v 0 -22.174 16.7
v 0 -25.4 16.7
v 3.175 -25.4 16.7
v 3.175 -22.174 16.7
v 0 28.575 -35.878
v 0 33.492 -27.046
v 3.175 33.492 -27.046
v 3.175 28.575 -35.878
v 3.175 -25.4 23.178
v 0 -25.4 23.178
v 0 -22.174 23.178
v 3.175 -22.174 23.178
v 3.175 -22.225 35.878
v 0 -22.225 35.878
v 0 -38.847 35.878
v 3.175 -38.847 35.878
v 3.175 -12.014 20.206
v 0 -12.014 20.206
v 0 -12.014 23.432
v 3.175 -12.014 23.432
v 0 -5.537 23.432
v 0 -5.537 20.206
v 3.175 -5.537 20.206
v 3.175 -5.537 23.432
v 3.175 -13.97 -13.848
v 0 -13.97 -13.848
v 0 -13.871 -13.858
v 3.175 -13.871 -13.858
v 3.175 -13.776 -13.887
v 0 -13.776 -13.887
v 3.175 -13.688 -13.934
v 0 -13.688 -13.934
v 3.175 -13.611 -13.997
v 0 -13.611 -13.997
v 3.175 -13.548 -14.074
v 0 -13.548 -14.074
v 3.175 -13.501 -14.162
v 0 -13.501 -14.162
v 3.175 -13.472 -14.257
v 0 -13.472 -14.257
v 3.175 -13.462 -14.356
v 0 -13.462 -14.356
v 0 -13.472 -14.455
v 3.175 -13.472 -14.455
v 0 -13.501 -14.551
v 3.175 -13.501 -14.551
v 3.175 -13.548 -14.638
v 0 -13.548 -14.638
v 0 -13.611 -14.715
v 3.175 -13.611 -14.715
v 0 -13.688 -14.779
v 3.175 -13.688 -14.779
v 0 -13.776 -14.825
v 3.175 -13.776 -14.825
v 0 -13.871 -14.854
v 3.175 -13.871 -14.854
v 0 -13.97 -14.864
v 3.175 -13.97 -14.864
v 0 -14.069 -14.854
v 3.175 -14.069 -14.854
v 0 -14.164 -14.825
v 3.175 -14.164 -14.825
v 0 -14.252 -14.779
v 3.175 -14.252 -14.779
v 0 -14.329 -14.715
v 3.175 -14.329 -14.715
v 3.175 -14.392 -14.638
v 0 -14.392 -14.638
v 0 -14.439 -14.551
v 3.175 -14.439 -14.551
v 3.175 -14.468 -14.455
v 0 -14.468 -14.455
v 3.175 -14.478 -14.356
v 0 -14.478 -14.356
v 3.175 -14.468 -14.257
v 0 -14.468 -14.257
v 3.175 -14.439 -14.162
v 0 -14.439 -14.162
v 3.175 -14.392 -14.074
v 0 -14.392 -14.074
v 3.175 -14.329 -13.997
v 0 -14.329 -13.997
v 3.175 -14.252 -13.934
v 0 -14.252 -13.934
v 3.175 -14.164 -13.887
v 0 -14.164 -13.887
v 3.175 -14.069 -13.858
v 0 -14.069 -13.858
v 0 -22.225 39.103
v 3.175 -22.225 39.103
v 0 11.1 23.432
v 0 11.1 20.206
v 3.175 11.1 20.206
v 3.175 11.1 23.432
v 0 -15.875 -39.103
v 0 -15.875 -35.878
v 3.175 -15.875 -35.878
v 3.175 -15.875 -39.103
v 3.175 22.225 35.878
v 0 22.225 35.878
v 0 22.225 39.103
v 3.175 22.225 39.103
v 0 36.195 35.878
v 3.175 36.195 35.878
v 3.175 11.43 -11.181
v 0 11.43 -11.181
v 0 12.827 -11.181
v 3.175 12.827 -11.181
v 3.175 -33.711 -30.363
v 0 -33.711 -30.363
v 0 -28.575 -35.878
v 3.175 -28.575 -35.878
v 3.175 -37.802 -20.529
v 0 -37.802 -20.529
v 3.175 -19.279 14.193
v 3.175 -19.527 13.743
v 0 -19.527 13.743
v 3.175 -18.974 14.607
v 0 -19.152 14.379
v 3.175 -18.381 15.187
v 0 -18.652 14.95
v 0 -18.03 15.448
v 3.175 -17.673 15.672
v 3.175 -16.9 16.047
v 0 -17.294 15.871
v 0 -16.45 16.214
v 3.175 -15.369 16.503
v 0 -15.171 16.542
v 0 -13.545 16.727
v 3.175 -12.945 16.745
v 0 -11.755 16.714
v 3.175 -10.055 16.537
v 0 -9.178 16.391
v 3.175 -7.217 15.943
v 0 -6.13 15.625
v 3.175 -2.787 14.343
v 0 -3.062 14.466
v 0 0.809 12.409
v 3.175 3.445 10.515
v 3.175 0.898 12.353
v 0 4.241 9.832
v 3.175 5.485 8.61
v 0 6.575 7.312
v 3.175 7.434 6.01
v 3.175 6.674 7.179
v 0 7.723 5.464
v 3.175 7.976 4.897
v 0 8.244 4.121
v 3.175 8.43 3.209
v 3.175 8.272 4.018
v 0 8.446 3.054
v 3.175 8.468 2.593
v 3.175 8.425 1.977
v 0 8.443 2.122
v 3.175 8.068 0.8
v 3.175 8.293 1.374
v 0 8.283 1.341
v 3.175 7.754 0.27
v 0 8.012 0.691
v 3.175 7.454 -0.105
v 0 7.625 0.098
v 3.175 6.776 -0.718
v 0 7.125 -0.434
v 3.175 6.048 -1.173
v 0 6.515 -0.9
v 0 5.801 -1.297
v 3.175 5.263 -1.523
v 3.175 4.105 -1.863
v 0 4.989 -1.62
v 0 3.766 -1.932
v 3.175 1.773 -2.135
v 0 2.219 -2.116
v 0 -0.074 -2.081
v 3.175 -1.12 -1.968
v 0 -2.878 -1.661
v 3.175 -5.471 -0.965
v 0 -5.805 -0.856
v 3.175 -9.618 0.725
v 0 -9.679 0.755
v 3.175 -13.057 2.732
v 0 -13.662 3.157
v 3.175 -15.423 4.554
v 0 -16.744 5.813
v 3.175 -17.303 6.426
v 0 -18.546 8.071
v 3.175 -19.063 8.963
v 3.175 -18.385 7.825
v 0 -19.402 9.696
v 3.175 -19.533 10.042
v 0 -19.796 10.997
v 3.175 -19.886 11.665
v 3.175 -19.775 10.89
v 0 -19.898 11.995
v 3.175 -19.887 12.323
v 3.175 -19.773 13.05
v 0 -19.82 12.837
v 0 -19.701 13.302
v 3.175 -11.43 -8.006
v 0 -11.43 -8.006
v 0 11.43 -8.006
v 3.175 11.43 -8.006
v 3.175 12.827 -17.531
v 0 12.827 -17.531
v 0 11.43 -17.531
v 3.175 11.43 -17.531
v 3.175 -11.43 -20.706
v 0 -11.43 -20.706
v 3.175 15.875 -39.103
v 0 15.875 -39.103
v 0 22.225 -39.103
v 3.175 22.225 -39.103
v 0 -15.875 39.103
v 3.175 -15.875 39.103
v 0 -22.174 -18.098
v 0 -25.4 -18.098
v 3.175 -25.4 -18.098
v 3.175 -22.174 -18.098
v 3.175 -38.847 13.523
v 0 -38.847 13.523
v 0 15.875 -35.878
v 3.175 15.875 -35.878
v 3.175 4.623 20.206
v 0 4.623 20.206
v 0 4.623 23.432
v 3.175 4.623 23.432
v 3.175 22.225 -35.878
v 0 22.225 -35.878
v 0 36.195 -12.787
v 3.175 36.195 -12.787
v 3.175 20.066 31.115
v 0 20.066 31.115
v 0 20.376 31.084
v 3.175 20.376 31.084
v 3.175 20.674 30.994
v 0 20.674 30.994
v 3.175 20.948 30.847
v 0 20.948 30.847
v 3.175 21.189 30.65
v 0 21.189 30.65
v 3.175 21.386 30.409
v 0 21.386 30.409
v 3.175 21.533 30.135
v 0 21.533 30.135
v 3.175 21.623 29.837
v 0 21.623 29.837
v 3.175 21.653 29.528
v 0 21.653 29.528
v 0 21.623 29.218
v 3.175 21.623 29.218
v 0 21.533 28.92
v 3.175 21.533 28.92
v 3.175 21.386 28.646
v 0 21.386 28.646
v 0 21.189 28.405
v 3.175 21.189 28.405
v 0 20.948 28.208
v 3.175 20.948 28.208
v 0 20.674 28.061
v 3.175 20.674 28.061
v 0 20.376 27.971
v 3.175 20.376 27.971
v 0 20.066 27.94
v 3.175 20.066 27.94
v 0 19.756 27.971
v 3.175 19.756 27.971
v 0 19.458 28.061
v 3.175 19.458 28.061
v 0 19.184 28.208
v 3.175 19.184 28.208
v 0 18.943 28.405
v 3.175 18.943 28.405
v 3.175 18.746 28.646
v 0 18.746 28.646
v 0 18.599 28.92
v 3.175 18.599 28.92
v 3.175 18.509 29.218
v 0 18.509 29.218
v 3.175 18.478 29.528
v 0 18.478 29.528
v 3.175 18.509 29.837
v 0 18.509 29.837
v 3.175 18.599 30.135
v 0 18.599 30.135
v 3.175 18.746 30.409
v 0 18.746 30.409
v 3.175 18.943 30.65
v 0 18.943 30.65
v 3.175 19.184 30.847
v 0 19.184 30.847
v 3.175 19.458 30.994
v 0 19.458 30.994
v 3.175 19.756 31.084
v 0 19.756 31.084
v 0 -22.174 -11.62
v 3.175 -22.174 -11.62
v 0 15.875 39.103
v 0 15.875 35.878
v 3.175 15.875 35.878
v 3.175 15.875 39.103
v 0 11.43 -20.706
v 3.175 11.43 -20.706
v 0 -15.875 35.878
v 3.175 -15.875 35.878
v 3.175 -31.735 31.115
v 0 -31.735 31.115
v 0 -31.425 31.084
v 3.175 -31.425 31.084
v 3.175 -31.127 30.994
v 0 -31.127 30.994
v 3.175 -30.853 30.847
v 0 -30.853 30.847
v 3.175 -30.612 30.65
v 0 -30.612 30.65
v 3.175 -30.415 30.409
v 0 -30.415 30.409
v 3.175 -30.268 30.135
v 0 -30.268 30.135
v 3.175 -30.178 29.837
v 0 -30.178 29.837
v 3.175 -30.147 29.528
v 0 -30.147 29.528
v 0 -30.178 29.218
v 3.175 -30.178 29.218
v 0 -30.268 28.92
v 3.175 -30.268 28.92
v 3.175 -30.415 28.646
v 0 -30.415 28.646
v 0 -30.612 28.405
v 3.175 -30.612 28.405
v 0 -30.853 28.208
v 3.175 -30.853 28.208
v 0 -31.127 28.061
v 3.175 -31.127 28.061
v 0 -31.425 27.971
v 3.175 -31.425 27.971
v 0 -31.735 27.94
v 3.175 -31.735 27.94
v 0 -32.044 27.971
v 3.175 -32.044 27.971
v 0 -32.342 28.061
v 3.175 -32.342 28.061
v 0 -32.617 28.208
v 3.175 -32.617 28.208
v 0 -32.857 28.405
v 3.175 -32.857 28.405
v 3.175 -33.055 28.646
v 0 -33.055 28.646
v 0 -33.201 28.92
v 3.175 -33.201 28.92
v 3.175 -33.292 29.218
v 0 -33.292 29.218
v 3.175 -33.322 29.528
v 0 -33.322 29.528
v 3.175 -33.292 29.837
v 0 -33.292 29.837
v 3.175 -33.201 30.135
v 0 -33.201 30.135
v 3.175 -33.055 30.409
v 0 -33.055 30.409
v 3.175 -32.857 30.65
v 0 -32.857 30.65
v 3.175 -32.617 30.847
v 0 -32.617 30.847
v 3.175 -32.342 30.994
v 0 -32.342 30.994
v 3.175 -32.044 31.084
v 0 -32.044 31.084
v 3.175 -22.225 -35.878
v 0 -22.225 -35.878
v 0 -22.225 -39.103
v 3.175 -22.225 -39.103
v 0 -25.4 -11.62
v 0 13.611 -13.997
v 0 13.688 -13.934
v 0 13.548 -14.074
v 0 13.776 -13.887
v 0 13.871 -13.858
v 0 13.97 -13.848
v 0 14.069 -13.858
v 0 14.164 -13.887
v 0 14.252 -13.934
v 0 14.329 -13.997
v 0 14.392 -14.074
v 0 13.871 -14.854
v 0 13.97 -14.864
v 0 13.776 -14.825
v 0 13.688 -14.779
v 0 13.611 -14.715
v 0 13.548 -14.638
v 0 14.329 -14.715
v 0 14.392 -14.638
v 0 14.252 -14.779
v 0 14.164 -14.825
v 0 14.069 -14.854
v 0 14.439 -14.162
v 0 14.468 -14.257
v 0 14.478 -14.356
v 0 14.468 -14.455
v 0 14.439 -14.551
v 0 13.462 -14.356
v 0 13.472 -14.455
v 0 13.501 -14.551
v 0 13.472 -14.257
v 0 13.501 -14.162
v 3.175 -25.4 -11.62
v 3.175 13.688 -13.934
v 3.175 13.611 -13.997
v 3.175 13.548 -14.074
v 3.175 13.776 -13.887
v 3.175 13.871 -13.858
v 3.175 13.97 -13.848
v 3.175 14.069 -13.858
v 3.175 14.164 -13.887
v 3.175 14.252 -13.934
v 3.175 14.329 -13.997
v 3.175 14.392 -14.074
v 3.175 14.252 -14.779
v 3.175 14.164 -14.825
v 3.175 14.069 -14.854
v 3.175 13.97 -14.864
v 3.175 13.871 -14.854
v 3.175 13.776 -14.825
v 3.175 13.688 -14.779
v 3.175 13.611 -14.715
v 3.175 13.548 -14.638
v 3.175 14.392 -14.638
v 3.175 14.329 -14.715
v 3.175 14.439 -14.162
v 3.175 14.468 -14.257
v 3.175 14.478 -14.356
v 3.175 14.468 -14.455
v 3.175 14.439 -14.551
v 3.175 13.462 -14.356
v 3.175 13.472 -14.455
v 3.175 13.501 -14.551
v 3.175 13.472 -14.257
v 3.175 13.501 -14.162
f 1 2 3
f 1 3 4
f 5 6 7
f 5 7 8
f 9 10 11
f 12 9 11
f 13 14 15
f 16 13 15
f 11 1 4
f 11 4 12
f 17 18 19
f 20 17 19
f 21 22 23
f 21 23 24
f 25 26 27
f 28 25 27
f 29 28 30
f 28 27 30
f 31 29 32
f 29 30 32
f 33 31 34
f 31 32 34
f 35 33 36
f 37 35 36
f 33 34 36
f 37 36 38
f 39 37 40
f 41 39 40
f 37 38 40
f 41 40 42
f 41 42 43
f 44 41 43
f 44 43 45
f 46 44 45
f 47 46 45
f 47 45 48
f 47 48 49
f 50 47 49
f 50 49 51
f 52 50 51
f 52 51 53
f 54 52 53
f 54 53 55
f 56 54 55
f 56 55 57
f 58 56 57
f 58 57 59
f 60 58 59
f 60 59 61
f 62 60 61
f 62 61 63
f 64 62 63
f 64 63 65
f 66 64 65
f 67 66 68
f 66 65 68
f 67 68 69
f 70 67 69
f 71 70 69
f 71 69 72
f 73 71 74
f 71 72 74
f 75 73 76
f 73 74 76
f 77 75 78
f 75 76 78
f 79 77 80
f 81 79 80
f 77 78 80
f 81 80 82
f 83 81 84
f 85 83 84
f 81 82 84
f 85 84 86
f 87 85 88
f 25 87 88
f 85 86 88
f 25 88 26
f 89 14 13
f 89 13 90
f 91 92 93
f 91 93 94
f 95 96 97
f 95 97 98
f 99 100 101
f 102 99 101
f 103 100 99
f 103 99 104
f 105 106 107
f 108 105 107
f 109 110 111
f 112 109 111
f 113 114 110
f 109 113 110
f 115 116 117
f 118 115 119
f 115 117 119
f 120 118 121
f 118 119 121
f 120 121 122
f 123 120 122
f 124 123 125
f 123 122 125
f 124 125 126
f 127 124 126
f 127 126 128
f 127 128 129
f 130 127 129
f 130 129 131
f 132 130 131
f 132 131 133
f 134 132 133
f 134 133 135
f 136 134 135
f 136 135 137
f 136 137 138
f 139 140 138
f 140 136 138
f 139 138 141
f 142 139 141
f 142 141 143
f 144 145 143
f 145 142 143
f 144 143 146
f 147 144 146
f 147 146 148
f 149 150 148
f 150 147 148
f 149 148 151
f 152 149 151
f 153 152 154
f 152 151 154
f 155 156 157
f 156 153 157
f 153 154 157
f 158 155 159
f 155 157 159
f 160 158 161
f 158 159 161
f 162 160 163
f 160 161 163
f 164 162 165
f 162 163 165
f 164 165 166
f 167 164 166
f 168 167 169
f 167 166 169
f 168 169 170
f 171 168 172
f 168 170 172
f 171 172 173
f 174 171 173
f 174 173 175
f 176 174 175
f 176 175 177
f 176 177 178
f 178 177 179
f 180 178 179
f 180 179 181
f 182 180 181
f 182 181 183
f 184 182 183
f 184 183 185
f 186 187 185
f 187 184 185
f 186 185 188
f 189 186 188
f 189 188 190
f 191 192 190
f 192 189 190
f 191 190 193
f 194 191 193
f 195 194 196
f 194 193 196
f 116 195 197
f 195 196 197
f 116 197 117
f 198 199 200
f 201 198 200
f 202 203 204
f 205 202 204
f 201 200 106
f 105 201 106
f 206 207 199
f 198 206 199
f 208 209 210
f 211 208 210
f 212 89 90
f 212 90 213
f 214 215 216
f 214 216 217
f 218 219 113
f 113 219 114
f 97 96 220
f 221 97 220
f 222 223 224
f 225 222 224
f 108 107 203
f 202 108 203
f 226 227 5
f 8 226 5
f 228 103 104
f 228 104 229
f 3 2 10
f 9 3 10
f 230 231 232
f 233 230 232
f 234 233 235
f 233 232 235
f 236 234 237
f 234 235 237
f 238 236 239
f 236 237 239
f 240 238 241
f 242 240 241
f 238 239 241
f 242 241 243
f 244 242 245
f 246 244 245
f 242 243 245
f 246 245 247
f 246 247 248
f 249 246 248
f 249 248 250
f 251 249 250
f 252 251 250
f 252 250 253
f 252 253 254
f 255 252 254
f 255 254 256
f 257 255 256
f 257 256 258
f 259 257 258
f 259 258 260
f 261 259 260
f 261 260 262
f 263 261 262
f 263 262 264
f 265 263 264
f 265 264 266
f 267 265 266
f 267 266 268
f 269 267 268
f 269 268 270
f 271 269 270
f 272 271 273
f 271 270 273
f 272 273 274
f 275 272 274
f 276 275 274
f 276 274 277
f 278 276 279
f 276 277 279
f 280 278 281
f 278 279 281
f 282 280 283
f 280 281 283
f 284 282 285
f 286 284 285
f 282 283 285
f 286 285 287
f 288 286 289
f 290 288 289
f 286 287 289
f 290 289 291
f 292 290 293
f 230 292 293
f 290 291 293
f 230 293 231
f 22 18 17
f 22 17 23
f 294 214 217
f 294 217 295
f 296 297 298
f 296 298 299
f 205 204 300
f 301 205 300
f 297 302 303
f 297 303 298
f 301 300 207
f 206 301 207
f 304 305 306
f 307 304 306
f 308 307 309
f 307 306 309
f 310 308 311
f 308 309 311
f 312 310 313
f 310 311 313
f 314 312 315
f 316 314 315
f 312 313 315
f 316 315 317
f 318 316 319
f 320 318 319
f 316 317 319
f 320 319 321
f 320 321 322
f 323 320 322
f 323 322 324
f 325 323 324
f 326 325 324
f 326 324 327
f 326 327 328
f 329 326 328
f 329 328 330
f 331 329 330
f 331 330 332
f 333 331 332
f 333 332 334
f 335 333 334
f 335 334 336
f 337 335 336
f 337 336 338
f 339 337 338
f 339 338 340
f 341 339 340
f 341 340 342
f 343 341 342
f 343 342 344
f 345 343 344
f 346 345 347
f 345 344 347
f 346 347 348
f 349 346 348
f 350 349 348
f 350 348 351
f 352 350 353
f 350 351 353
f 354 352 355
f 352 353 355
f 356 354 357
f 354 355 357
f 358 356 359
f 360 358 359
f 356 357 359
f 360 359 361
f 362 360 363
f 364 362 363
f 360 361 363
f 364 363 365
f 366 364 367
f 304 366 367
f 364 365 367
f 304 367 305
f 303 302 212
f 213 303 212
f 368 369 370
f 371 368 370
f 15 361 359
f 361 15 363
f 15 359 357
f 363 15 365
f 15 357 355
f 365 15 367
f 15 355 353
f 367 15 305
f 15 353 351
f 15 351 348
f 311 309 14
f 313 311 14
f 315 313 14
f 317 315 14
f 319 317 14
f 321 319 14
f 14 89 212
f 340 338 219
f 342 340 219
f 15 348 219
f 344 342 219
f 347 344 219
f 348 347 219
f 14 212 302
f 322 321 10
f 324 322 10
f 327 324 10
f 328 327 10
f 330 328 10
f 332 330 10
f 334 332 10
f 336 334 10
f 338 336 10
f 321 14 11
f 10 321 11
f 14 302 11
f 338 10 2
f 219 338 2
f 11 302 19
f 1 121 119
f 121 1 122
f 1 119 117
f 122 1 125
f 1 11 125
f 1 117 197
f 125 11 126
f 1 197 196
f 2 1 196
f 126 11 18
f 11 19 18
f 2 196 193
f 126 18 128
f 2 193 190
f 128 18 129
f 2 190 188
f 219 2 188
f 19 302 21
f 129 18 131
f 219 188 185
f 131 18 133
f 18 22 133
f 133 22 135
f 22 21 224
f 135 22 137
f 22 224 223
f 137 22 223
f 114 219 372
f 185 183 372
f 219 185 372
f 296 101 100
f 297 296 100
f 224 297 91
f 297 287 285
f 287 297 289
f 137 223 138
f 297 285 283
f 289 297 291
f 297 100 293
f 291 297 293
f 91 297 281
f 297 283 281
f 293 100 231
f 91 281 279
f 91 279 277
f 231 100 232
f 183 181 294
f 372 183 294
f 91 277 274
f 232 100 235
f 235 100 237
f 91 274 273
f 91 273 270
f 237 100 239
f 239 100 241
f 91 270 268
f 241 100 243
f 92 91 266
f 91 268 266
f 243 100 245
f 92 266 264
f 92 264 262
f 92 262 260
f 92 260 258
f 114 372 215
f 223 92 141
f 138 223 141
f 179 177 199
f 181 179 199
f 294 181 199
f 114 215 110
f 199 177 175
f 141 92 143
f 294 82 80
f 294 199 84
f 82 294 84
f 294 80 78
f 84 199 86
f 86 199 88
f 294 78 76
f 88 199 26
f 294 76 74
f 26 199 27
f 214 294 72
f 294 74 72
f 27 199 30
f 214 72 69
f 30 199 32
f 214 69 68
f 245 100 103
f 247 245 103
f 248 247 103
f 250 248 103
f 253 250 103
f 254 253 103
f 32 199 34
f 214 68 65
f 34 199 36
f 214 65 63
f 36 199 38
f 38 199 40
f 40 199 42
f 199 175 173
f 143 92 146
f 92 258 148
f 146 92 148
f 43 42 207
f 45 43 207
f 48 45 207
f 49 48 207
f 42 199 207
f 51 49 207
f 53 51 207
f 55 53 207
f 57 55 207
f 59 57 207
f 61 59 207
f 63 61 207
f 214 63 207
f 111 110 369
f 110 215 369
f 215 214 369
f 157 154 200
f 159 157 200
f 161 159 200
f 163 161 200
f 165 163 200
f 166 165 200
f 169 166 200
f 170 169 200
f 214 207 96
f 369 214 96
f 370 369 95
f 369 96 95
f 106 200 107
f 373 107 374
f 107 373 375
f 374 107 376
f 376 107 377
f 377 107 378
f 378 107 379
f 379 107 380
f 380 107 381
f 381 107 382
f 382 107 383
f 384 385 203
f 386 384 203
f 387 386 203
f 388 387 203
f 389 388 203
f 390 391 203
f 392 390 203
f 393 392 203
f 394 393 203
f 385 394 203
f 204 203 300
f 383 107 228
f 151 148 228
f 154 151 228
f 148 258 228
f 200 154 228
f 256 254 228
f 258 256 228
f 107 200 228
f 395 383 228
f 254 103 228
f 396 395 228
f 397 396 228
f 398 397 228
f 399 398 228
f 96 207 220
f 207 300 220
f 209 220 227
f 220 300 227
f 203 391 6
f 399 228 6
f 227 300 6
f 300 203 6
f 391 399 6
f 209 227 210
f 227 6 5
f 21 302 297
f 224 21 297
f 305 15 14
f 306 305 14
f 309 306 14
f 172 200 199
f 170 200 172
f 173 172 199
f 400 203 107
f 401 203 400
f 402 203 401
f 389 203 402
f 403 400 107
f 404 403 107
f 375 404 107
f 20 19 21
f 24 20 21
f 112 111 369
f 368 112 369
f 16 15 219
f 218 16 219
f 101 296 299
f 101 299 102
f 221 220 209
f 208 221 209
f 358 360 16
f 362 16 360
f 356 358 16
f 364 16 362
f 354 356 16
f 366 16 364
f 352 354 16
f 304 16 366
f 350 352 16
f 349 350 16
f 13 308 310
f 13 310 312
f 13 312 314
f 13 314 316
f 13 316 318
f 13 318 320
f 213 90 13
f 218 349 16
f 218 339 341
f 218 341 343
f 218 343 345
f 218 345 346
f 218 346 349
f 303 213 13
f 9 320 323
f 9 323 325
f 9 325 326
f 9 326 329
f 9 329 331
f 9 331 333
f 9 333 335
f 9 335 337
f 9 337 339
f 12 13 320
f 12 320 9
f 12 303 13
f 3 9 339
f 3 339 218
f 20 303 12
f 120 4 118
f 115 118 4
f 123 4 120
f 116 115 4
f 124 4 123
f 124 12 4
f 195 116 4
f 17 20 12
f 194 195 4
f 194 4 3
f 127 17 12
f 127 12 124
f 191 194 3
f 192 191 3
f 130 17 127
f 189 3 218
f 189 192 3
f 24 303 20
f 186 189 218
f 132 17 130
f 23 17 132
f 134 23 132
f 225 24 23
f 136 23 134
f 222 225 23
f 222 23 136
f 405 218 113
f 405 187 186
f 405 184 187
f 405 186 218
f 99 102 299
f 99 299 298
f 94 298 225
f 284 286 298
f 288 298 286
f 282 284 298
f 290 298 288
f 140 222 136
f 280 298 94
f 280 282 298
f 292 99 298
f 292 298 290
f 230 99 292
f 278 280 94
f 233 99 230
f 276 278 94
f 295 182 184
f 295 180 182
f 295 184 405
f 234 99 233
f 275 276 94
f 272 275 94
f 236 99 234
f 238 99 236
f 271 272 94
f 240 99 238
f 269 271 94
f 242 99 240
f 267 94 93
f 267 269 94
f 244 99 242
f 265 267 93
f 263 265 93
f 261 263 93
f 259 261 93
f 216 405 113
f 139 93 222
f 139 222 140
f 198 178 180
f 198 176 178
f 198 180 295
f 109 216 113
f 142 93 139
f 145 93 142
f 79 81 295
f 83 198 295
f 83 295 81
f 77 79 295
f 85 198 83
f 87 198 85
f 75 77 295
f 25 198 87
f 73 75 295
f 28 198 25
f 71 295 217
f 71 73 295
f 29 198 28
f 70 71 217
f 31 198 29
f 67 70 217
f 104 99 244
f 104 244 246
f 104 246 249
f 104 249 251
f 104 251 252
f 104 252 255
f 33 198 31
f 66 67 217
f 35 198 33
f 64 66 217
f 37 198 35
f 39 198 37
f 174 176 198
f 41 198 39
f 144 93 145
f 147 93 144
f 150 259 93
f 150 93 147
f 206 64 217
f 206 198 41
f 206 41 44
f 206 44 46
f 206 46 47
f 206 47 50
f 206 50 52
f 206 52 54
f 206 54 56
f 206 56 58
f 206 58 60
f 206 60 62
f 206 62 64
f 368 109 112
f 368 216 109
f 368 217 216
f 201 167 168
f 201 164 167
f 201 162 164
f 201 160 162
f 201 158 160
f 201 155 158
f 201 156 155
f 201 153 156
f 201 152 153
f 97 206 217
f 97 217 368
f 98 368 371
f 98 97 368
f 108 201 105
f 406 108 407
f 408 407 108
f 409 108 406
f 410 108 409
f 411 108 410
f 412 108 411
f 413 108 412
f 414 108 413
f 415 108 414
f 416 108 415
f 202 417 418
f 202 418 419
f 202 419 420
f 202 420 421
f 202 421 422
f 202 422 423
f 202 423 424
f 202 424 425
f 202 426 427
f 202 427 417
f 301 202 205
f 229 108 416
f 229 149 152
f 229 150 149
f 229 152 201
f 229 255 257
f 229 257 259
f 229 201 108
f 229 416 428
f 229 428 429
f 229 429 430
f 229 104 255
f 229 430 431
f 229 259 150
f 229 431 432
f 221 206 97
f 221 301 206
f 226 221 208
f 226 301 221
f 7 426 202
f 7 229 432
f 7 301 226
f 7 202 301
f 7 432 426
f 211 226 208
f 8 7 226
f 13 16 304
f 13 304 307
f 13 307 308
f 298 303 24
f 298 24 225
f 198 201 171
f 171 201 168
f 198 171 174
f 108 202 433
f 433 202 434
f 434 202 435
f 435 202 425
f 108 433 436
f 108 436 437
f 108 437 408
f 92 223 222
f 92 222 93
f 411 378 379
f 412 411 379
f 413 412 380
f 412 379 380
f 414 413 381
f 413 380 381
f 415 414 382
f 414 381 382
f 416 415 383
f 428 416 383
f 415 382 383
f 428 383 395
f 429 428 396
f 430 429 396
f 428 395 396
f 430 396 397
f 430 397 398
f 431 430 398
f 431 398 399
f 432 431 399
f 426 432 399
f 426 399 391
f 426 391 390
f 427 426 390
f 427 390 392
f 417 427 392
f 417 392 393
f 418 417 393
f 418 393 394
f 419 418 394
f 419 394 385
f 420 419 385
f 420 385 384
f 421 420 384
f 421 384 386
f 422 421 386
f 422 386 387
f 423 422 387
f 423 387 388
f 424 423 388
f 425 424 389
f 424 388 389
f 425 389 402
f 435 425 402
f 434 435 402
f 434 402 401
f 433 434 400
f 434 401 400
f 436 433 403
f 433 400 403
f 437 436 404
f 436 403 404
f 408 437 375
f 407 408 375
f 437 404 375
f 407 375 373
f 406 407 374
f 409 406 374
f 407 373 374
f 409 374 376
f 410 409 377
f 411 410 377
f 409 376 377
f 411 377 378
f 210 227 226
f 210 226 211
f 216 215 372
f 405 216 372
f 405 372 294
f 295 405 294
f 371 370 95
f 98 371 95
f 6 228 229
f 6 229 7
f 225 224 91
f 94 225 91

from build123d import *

# Parameters (mm, degrees)
SKETCH1_W                            = 71.755
SKETCH1_H                            = 57.15
MAIN_BODY_DEPTH                      = 3.175
SKETCH2_W                            = 3.2258
SKETCH2_H                            = 6.35
TABS_FRONT_DEPTH                     = 3.175
SKETCH3_R                            = 0.508
CUT_FOR_EAR_MOTOR_DEPTH              = 4.175
SKETCH4_W                            = 3.2258
SKETCH4_H                            = 6.477
SKETCH4_W_2                          = 6.477
SKETCH4_H_2                          = 3.2258
CUT_FOR_TABS_DEPTH                   = 4.175
BOSS_EXTRUDE1_DEPTH                  = 3.175
SKETCH6_R                            = 1.5875
CUT_FOR_FACE_PLATE_MOUNT_SCREW_DEPTH = 4.175
SKETCH7_RX                           = 15.24
SKETCH7_RY                           = 7.62
ELLIPSE_CUT_DEPTH                    = 4.175


with BuildPart() as part:
    # Sketch1 → main body (new body)
    with BuildSketch(Plane(origin=(0, 0, 0), x_dir=(0, 0, -1), z_dir=(1, 0, 0))):
        Rectangle(SKETCH1_W, SKETCH1_H)
    extrude(amount=MAIN_BODY_DEPTH)

    # Sketch2 → tabs front (add)
    with BuildSketch(Plane.ZY):
        with Locations((37.4904, 19.05)):
            Rectangle(SKETCH2_W, SKETCH2_H)
        with Locations((37.4904, -19.05)):
            Rectangle(SKETCH2_W, SKETCH2_H)
    tabs_front = extrude(amount=-TABS_FRONT_DEPTH)

    # mirror of tabs (back): tabs front across plane
    add(tabs_front.mirror(Plane.XY))

    # Sketch3 → cut for ear motor (cut, through all)
    with BuildSketch(Plane.ZY):
        with Locations((-14.356162211, 13.97)):
            Circle(SKETCH3_R)
        with Locations((-14.356162211, -13.97)):
            Circle(SKETCH3_R)
        Polygon((-20.706162211, -11.43), (-8.006162211, -11.43), (-8.006162211, 11.43), (-11.181162211, 11.43), (-11.181162211, 12.827), (-17.531162211, 12.827), (-17.531162211, 11.43), (-20.706162211, 11.43), align=None)
    extrude(amount=-CUT_FOR_EAR_MOTOR_DEPTH, mode=Mode.SUBTRACT)

    # Sketch4 → cut for tabs (cut, through all)
    with BuildSketch(Plane.ZY):
        with Locations((21.8186, 7.8613)):
            Rectangle(SKETCH4_W, SKETCH4_H)
        with Locations((21.8186, -8.7757)):
            Rectangle(SKETCH4_W, SKETCH4_H)
        with Locations((19.939, -23.7871)):
            Rectangle(SKETCH4_W_2, SKETCH4_H_2)
        with Locations((-14.859, -23.7871)):
            Rectangle(SKETCH4_W_2, SKETCH4_H_2)
    extrude(amount=-CUT_FOR_TABS_DEPTH, mode=Mode.SUBTRACT)

    # Sketch5 → Boss-Extrude1 (add)
    with BuildSketch(Plane.ZY):
        Polygon((-35.8775, -28.575), (35.8775, -28.575), (35.8775, -38.846719594), (13.523283037, -38.846719594), (-20.528592985, -37.801776478), (-30.363311769, -33.710859797), align=None)
        Polygon((-12.787335482, 36.195), (-27.046355521, 33.492436966), (-35.8775, 28.575), (35.8775, 28.575), (35.8775, 36.195), (26.200162008, 36.195), align=None)
    extrude(amount=-BOSS_EXTRUDE1_DEPTH)

    # Sketch6 → cut for face plate mount screw (cut, through all)
    with BuildSketch(Plane.ZY):
        with Locations((29.5275, 20.066)):
            Circle(SKETCH6_R)
        with Locations((29.5275, -31.734719594)):
            Circle(SKETCH6_R)
    extrude(amount=-CUT_FOR_FACE_PLATE_MOUNT_SCREW_DEPTH, mode=Mode.SUBTRACT)

    # Sketch7 → ellipse cut (cut, through all)
    with BuildSketch(Plane.ZY):
        with Locations(Location((7.3025, -5.715), (0, 0, -65))):
            Ellipse(SKETCH7_RX, SKETCH7_RY)
    extrude(amount=-ELLIPSE_CUT_DEPTH, mode=Mode.SUBTRACT)


solid = part.part
